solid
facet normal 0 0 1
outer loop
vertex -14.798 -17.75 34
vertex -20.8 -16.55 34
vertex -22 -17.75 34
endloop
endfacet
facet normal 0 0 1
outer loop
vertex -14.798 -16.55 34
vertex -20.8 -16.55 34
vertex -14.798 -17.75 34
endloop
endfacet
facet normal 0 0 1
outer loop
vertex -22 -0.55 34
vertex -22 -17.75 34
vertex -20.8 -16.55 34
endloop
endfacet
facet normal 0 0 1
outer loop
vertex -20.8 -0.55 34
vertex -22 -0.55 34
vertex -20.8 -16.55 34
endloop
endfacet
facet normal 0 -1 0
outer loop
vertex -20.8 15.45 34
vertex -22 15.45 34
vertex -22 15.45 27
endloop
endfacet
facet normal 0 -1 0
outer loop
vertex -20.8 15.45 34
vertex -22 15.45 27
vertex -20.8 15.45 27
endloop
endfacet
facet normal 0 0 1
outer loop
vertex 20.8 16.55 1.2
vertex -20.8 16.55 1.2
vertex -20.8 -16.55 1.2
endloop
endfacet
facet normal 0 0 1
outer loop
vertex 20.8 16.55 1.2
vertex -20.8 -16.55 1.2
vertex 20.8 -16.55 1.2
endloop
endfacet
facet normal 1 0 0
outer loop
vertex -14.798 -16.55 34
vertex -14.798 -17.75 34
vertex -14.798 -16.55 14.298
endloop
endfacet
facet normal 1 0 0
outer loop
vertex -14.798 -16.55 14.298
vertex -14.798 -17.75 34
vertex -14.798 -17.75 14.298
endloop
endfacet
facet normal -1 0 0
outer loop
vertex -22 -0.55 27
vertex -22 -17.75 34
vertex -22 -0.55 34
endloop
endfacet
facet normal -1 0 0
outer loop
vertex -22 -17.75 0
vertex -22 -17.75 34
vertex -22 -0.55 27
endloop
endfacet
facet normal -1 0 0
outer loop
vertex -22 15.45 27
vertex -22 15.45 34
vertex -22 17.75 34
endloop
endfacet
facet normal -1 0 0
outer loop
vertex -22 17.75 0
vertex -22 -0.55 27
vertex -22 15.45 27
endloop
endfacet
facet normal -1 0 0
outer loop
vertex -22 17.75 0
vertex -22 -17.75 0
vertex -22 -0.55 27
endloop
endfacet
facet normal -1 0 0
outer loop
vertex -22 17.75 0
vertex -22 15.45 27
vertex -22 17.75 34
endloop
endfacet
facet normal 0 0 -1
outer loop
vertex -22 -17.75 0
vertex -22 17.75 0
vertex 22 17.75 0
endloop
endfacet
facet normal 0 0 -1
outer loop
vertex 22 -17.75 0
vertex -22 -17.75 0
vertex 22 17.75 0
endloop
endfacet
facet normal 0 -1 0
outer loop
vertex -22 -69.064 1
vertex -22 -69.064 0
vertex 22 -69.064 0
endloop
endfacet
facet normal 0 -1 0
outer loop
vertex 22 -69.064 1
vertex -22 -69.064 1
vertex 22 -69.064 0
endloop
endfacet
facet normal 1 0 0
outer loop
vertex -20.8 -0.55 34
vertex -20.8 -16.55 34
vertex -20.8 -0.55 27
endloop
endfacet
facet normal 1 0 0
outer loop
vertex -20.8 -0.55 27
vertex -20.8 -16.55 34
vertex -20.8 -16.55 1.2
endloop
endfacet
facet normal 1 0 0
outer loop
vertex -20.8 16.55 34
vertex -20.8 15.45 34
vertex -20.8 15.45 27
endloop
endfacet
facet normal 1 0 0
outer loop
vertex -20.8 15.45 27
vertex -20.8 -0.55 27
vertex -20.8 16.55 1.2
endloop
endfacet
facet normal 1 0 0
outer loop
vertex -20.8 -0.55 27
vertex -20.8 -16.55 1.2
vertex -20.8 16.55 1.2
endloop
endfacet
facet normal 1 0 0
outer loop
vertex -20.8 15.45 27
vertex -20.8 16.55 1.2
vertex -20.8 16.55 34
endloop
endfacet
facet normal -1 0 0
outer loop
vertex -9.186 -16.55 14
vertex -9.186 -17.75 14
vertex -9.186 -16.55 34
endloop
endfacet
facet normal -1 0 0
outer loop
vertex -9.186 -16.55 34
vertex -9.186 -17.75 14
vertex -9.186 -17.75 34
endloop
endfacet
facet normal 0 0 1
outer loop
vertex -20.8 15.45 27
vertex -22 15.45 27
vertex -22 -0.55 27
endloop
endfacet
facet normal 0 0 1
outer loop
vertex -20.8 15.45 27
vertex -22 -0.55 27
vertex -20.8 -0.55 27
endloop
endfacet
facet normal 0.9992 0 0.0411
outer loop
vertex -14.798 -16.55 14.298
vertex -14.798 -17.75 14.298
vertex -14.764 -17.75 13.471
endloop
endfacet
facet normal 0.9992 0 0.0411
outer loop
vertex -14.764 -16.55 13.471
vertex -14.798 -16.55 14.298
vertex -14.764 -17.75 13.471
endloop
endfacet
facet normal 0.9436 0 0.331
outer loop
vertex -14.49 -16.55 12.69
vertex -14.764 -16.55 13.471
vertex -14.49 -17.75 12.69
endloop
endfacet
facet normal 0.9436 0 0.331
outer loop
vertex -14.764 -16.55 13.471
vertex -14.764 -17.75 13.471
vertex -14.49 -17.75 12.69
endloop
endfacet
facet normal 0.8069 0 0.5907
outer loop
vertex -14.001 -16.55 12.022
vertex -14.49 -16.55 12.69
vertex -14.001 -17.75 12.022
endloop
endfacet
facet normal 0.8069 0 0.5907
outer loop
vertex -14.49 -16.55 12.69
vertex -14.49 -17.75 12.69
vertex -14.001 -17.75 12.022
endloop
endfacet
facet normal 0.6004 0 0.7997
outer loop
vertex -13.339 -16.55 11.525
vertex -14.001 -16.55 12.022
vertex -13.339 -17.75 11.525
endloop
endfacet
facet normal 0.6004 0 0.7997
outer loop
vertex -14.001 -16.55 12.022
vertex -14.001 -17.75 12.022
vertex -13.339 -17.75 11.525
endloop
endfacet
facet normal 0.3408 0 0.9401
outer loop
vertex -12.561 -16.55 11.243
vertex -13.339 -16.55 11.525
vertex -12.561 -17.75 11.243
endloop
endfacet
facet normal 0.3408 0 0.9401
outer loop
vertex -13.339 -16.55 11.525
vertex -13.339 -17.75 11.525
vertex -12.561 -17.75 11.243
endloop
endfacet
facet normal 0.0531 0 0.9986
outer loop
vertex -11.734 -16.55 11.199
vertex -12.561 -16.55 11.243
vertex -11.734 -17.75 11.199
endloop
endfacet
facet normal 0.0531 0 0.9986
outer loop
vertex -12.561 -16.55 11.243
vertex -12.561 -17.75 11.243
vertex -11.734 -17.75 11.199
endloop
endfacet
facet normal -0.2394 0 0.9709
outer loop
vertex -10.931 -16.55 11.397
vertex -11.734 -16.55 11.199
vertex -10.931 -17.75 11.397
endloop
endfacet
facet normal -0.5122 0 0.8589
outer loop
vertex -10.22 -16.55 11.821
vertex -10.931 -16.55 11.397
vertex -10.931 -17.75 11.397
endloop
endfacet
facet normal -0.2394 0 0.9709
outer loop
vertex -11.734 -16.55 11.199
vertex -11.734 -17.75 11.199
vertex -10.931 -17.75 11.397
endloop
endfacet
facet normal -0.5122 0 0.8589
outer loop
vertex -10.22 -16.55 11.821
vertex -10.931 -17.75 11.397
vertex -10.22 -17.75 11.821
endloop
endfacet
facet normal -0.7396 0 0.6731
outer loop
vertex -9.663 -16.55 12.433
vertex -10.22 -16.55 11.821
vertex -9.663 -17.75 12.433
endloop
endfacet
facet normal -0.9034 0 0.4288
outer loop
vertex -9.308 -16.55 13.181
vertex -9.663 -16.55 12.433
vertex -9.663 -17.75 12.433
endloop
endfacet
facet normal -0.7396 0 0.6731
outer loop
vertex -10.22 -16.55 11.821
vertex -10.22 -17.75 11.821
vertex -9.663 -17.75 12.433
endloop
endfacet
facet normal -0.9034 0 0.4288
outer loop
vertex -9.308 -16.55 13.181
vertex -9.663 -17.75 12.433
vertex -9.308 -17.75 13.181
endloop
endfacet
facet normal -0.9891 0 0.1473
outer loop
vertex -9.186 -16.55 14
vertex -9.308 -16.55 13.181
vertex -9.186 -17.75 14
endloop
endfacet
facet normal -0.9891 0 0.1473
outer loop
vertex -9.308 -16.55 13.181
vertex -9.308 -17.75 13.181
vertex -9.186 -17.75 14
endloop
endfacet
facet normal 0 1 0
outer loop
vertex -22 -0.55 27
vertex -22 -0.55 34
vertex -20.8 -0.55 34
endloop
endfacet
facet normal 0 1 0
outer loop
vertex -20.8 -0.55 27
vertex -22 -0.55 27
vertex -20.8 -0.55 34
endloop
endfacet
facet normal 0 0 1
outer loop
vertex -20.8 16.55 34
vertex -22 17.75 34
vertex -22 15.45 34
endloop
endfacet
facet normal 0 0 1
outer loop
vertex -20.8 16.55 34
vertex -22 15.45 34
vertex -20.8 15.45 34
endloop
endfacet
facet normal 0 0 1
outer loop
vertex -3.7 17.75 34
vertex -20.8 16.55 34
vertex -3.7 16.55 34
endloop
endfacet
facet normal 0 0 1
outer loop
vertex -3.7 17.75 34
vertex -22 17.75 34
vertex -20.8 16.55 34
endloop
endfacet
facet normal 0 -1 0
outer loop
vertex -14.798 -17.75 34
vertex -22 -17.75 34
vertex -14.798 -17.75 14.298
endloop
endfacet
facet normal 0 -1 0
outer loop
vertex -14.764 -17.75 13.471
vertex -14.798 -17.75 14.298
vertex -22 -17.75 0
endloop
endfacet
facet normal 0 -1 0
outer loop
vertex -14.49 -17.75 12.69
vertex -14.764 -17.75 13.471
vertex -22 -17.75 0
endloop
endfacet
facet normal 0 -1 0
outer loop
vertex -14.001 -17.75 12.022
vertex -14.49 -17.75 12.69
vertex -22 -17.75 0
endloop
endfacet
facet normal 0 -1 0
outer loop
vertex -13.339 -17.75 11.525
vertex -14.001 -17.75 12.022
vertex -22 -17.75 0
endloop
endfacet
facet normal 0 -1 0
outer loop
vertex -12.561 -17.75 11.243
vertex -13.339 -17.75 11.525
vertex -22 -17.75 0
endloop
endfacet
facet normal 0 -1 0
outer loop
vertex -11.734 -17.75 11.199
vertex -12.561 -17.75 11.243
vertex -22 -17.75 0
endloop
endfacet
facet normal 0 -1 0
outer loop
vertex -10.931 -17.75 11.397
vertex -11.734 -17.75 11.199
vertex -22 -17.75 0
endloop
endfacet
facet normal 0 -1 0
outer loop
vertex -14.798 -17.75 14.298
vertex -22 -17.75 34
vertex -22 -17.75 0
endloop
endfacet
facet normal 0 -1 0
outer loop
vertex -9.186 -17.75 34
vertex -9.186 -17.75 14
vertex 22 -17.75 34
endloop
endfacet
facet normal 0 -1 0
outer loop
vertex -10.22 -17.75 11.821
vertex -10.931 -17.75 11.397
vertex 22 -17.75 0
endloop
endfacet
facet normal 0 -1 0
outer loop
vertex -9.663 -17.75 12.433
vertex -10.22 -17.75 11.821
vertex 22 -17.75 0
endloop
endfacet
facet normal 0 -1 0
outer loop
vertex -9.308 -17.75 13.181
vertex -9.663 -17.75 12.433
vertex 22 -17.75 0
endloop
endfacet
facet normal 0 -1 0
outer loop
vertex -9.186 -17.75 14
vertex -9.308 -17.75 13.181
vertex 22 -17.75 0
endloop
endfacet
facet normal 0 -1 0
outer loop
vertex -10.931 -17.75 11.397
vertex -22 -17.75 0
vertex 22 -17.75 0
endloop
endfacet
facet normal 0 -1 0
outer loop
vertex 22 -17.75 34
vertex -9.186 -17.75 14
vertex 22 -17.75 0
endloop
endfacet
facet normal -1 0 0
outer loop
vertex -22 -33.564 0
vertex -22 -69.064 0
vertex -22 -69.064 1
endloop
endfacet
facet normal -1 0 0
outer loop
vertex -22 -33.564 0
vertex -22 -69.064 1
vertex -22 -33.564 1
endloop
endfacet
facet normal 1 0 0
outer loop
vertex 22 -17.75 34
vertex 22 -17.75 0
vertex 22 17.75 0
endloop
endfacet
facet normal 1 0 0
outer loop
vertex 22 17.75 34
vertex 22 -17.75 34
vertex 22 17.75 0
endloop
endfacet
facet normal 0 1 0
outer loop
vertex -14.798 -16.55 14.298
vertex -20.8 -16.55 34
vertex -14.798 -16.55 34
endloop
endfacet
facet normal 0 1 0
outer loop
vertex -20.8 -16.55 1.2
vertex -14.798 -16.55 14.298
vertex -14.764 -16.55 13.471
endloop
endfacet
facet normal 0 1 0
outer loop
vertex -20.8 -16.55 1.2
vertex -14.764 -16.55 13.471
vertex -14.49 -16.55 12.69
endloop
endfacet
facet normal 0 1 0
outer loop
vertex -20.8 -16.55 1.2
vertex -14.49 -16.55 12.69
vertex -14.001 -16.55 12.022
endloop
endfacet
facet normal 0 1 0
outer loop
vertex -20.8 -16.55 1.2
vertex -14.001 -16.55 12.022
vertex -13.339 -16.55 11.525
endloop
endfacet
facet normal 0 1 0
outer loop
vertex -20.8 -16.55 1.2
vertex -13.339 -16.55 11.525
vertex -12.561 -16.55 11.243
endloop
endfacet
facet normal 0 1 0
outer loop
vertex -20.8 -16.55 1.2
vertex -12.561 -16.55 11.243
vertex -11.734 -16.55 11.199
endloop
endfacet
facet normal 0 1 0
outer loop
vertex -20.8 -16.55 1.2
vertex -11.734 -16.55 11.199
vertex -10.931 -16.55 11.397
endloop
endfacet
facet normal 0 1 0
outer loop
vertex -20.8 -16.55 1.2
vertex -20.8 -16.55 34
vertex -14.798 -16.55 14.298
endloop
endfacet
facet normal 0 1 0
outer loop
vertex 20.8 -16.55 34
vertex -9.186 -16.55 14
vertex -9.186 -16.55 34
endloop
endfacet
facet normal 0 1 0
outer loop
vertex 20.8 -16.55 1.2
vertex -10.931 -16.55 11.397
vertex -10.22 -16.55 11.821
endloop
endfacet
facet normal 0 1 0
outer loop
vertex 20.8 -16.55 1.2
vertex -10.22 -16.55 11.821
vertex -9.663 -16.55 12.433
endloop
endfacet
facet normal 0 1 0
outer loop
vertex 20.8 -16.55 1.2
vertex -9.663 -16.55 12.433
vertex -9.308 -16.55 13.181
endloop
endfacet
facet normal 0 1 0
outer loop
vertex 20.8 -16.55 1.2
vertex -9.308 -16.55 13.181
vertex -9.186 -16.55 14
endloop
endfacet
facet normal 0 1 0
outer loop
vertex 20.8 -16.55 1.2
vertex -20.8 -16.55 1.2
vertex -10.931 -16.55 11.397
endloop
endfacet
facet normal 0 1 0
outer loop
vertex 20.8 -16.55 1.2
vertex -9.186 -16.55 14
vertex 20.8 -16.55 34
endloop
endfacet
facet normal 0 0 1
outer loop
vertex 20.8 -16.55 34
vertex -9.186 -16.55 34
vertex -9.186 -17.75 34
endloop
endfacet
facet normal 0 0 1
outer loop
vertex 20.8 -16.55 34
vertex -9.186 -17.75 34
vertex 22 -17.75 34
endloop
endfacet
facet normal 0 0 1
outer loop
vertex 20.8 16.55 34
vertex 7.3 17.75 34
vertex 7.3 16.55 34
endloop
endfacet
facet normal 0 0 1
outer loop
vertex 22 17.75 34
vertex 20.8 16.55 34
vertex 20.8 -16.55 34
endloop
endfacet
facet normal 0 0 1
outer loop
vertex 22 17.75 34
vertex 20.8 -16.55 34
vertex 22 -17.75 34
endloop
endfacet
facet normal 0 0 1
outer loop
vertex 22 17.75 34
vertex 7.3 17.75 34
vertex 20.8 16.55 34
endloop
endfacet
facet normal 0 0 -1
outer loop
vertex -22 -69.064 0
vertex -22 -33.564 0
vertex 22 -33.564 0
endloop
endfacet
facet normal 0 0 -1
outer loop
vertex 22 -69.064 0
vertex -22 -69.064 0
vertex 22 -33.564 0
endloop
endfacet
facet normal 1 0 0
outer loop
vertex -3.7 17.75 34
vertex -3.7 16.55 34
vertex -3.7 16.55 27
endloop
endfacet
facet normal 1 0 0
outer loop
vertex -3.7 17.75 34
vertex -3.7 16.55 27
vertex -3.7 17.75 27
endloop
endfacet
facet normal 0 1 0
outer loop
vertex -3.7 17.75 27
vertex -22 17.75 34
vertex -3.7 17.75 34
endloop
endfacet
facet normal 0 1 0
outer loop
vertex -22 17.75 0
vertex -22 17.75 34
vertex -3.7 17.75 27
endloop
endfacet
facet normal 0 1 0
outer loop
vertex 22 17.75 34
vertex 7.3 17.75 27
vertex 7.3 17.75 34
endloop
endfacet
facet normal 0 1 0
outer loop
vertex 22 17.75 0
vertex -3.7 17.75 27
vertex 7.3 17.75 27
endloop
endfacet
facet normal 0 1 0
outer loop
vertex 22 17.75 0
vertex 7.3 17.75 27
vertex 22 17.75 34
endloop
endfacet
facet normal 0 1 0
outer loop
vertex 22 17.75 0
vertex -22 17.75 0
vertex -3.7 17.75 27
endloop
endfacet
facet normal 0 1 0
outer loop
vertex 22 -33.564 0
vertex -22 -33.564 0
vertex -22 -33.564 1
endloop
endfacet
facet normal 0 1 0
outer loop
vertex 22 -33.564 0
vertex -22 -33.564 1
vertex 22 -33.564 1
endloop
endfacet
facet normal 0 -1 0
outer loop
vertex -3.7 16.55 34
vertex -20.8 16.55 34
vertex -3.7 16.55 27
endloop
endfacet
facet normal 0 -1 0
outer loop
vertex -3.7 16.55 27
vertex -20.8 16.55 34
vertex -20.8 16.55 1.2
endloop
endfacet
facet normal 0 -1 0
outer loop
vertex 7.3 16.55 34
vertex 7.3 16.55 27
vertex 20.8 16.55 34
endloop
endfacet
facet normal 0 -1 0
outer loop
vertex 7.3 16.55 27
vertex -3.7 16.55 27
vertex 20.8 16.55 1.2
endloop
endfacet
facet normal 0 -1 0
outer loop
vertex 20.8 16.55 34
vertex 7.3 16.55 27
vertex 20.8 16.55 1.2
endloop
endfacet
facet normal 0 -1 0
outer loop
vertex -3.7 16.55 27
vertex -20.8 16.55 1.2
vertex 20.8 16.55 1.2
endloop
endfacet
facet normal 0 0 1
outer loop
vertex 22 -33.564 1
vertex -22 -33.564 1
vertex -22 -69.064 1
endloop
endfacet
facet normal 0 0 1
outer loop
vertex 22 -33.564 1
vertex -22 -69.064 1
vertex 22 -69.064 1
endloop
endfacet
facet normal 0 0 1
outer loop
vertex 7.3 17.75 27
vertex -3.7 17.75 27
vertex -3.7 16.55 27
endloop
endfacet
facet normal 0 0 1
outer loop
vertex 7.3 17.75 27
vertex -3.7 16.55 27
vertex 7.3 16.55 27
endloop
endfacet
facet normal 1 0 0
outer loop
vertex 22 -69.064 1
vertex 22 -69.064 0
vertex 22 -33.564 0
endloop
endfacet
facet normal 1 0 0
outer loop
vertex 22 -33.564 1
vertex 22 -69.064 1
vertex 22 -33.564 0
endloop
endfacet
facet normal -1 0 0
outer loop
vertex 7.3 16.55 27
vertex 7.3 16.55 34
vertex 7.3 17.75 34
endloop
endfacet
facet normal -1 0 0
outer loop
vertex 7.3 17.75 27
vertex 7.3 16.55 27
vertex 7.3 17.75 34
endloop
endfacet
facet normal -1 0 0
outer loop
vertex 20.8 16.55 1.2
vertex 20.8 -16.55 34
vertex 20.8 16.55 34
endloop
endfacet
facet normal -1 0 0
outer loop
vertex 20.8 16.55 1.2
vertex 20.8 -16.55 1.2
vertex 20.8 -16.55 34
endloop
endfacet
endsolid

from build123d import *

# Parameters (mm, degrees)
F0_W     = 44
F0_H     = 35.5
F1_DEPTH = 34
F2_T     = -1.2
F4_DEPTH = 1.2
F5_W     = 11
F5_H     = 1.2
F5_W_2   = 1.2
F5_H_2   = 16
F6_DEPTH = 7
F7_W     = 44
F7_H     = 35.5
F8_DEPTH = 1


with BuildPart() as f1:
    # F0 (on Top) → F1 (new body)
    with BuildSketch(Plane.XY):
        Rectangle(F0_W, F0_H)
    extrude(amount=F1_DEPTH)

    # F2
    f2_openings = [f1.faces().sort_by_distance(p)[0] for p in [
        (0, 0, 34),
    ]]
    offset(amount=F2_T, openings=f2_openings)

    # F3 (on face) → F4 (cut, through all)
    with BuildSketch(Plane.XZ.offset(17.75)):
        with BuildLine():
            Line((-14.7977748662, 14), (-9.1863577381, 14))
            ThreePointArc((-9.1863577381, 14), (-11.8505925452, 16.8096726127), (-14.7977748662, 14.2983933243))
            Line((-14.7977748662, 14.2983933243), (-14.7977748662, 14))
        make_face()
        with BuildLine():
            ThreePointArc((-14.7977748662, 14.2983933243), (-12.1494074548, 11.1903273873), (-9.1863577381, 14))
            Line((-9.1863577381, 14), (-14.7977748662, 14))
            Line((-14.7977748662, 14), (-14.7977748662, 14.2983933243))
        make_face()
        with BuildLine():
            ThreePointArc((-14.7977748662, 14.2983933243), (-11.8505925452, 16.8096726127), (-9.1863577381, 14))
            Line((-9.1863577381, 14), (-9.1863577381, 34))
            Line((-9.1863577381, 34), (-14.7977748662, 34))
            Line((-14.7977748662, 34), (-14.7977748662, 14.2983933243))
        make_face()
    extrude(amount=-F4_DEPTH, mode=Mode.SUBTRACT)

    # F5 (on face) → F6 (cut)
    with BuildSketch(Plane.XY.offset(34)):
        with Locations((1.8, 17.15)):
            Rectangle(F5_W, F5_H)
        with Locations((-21.4, 7.45)):
            Rectangle(F5_W_2, F5_H_2)
    extrude(amount=-F6_DEPTH, mode=Mode.SUBTRACT)


with BuildPart() as f8:
    # F7 (on Top) → F8 (new body)
    with BuildSketch(Plane.XY):
        with Locations((0, -51.3141791623)):
            Rectangle(F7_W, F7_H)
    extrude(amount=F8_DEPTH)


solid = Compound([f1.part, f8.part])
